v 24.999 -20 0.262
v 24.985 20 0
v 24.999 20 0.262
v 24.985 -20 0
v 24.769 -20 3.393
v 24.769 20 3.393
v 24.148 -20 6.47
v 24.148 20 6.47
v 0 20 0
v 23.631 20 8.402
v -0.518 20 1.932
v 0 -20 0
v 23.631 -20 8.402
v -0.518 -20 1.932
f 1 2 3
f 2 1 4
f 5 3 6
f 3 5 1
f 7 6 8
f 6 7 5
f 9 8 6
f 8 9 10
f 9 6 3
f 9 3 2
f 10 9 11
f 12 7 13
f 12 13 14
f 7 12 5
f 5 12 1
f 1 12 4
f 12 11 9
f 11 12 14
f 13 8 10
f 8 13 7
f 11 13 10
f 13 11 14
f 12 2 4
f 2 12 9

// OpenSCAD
// Creacion de cuña paramétrica para apoyo de camara en cuad

//Variables:
ancho=25;
largo=40;
grueso=2; // En el vertice de la cuña.
angulo=15; // En grados, menor de 90º

// Creacion del la cuña en los siguientes pasos: 
// 1. Creacion de un cilindro para la base del la cuña
// 2. Al cilindro anterior le hacemos una interseccion booleana para quedarnos con el cuarto inferior.
// 3. Se le crea un cubo superior para generar el grueso de la cuña
// 4. Se gira todo el cuerpor de la cuña el angulo
// 5. Se elimina la parte por debajo del plano XY

// 5.Sustraccion del cuerpo cubo de sobrante al cuerpo base
difference(){
// 4.Rotacion del cuerpo base
rotate([0,-angulo,0])
// 3. Cuerpo de la cuña incluido el gruueso
    union(){
    // 2.Cuerpo de la cuña
    intersection(){
    // 1. Cilindro base
    rotate([90,0,0])
    cylinder(r=ancho,h=largo,$fn=50, center=true);
    // 2.Cubo para Base
    translate([0,-((largo/2)+1),-ancho-2])
    cube([ancho+2,largo+2,ancho+2]);
    }
    //3.cubo de grosor superior
    translate([0,-largo/2,0])
    cube([ancho,largo,grueso]);
}
// 5.cubo para eliminiacion del sobrante
translate([-1,-((largo/2)+1),-ancho-2])
cube([ancho+2,largo+2,ancho+2]);
}
